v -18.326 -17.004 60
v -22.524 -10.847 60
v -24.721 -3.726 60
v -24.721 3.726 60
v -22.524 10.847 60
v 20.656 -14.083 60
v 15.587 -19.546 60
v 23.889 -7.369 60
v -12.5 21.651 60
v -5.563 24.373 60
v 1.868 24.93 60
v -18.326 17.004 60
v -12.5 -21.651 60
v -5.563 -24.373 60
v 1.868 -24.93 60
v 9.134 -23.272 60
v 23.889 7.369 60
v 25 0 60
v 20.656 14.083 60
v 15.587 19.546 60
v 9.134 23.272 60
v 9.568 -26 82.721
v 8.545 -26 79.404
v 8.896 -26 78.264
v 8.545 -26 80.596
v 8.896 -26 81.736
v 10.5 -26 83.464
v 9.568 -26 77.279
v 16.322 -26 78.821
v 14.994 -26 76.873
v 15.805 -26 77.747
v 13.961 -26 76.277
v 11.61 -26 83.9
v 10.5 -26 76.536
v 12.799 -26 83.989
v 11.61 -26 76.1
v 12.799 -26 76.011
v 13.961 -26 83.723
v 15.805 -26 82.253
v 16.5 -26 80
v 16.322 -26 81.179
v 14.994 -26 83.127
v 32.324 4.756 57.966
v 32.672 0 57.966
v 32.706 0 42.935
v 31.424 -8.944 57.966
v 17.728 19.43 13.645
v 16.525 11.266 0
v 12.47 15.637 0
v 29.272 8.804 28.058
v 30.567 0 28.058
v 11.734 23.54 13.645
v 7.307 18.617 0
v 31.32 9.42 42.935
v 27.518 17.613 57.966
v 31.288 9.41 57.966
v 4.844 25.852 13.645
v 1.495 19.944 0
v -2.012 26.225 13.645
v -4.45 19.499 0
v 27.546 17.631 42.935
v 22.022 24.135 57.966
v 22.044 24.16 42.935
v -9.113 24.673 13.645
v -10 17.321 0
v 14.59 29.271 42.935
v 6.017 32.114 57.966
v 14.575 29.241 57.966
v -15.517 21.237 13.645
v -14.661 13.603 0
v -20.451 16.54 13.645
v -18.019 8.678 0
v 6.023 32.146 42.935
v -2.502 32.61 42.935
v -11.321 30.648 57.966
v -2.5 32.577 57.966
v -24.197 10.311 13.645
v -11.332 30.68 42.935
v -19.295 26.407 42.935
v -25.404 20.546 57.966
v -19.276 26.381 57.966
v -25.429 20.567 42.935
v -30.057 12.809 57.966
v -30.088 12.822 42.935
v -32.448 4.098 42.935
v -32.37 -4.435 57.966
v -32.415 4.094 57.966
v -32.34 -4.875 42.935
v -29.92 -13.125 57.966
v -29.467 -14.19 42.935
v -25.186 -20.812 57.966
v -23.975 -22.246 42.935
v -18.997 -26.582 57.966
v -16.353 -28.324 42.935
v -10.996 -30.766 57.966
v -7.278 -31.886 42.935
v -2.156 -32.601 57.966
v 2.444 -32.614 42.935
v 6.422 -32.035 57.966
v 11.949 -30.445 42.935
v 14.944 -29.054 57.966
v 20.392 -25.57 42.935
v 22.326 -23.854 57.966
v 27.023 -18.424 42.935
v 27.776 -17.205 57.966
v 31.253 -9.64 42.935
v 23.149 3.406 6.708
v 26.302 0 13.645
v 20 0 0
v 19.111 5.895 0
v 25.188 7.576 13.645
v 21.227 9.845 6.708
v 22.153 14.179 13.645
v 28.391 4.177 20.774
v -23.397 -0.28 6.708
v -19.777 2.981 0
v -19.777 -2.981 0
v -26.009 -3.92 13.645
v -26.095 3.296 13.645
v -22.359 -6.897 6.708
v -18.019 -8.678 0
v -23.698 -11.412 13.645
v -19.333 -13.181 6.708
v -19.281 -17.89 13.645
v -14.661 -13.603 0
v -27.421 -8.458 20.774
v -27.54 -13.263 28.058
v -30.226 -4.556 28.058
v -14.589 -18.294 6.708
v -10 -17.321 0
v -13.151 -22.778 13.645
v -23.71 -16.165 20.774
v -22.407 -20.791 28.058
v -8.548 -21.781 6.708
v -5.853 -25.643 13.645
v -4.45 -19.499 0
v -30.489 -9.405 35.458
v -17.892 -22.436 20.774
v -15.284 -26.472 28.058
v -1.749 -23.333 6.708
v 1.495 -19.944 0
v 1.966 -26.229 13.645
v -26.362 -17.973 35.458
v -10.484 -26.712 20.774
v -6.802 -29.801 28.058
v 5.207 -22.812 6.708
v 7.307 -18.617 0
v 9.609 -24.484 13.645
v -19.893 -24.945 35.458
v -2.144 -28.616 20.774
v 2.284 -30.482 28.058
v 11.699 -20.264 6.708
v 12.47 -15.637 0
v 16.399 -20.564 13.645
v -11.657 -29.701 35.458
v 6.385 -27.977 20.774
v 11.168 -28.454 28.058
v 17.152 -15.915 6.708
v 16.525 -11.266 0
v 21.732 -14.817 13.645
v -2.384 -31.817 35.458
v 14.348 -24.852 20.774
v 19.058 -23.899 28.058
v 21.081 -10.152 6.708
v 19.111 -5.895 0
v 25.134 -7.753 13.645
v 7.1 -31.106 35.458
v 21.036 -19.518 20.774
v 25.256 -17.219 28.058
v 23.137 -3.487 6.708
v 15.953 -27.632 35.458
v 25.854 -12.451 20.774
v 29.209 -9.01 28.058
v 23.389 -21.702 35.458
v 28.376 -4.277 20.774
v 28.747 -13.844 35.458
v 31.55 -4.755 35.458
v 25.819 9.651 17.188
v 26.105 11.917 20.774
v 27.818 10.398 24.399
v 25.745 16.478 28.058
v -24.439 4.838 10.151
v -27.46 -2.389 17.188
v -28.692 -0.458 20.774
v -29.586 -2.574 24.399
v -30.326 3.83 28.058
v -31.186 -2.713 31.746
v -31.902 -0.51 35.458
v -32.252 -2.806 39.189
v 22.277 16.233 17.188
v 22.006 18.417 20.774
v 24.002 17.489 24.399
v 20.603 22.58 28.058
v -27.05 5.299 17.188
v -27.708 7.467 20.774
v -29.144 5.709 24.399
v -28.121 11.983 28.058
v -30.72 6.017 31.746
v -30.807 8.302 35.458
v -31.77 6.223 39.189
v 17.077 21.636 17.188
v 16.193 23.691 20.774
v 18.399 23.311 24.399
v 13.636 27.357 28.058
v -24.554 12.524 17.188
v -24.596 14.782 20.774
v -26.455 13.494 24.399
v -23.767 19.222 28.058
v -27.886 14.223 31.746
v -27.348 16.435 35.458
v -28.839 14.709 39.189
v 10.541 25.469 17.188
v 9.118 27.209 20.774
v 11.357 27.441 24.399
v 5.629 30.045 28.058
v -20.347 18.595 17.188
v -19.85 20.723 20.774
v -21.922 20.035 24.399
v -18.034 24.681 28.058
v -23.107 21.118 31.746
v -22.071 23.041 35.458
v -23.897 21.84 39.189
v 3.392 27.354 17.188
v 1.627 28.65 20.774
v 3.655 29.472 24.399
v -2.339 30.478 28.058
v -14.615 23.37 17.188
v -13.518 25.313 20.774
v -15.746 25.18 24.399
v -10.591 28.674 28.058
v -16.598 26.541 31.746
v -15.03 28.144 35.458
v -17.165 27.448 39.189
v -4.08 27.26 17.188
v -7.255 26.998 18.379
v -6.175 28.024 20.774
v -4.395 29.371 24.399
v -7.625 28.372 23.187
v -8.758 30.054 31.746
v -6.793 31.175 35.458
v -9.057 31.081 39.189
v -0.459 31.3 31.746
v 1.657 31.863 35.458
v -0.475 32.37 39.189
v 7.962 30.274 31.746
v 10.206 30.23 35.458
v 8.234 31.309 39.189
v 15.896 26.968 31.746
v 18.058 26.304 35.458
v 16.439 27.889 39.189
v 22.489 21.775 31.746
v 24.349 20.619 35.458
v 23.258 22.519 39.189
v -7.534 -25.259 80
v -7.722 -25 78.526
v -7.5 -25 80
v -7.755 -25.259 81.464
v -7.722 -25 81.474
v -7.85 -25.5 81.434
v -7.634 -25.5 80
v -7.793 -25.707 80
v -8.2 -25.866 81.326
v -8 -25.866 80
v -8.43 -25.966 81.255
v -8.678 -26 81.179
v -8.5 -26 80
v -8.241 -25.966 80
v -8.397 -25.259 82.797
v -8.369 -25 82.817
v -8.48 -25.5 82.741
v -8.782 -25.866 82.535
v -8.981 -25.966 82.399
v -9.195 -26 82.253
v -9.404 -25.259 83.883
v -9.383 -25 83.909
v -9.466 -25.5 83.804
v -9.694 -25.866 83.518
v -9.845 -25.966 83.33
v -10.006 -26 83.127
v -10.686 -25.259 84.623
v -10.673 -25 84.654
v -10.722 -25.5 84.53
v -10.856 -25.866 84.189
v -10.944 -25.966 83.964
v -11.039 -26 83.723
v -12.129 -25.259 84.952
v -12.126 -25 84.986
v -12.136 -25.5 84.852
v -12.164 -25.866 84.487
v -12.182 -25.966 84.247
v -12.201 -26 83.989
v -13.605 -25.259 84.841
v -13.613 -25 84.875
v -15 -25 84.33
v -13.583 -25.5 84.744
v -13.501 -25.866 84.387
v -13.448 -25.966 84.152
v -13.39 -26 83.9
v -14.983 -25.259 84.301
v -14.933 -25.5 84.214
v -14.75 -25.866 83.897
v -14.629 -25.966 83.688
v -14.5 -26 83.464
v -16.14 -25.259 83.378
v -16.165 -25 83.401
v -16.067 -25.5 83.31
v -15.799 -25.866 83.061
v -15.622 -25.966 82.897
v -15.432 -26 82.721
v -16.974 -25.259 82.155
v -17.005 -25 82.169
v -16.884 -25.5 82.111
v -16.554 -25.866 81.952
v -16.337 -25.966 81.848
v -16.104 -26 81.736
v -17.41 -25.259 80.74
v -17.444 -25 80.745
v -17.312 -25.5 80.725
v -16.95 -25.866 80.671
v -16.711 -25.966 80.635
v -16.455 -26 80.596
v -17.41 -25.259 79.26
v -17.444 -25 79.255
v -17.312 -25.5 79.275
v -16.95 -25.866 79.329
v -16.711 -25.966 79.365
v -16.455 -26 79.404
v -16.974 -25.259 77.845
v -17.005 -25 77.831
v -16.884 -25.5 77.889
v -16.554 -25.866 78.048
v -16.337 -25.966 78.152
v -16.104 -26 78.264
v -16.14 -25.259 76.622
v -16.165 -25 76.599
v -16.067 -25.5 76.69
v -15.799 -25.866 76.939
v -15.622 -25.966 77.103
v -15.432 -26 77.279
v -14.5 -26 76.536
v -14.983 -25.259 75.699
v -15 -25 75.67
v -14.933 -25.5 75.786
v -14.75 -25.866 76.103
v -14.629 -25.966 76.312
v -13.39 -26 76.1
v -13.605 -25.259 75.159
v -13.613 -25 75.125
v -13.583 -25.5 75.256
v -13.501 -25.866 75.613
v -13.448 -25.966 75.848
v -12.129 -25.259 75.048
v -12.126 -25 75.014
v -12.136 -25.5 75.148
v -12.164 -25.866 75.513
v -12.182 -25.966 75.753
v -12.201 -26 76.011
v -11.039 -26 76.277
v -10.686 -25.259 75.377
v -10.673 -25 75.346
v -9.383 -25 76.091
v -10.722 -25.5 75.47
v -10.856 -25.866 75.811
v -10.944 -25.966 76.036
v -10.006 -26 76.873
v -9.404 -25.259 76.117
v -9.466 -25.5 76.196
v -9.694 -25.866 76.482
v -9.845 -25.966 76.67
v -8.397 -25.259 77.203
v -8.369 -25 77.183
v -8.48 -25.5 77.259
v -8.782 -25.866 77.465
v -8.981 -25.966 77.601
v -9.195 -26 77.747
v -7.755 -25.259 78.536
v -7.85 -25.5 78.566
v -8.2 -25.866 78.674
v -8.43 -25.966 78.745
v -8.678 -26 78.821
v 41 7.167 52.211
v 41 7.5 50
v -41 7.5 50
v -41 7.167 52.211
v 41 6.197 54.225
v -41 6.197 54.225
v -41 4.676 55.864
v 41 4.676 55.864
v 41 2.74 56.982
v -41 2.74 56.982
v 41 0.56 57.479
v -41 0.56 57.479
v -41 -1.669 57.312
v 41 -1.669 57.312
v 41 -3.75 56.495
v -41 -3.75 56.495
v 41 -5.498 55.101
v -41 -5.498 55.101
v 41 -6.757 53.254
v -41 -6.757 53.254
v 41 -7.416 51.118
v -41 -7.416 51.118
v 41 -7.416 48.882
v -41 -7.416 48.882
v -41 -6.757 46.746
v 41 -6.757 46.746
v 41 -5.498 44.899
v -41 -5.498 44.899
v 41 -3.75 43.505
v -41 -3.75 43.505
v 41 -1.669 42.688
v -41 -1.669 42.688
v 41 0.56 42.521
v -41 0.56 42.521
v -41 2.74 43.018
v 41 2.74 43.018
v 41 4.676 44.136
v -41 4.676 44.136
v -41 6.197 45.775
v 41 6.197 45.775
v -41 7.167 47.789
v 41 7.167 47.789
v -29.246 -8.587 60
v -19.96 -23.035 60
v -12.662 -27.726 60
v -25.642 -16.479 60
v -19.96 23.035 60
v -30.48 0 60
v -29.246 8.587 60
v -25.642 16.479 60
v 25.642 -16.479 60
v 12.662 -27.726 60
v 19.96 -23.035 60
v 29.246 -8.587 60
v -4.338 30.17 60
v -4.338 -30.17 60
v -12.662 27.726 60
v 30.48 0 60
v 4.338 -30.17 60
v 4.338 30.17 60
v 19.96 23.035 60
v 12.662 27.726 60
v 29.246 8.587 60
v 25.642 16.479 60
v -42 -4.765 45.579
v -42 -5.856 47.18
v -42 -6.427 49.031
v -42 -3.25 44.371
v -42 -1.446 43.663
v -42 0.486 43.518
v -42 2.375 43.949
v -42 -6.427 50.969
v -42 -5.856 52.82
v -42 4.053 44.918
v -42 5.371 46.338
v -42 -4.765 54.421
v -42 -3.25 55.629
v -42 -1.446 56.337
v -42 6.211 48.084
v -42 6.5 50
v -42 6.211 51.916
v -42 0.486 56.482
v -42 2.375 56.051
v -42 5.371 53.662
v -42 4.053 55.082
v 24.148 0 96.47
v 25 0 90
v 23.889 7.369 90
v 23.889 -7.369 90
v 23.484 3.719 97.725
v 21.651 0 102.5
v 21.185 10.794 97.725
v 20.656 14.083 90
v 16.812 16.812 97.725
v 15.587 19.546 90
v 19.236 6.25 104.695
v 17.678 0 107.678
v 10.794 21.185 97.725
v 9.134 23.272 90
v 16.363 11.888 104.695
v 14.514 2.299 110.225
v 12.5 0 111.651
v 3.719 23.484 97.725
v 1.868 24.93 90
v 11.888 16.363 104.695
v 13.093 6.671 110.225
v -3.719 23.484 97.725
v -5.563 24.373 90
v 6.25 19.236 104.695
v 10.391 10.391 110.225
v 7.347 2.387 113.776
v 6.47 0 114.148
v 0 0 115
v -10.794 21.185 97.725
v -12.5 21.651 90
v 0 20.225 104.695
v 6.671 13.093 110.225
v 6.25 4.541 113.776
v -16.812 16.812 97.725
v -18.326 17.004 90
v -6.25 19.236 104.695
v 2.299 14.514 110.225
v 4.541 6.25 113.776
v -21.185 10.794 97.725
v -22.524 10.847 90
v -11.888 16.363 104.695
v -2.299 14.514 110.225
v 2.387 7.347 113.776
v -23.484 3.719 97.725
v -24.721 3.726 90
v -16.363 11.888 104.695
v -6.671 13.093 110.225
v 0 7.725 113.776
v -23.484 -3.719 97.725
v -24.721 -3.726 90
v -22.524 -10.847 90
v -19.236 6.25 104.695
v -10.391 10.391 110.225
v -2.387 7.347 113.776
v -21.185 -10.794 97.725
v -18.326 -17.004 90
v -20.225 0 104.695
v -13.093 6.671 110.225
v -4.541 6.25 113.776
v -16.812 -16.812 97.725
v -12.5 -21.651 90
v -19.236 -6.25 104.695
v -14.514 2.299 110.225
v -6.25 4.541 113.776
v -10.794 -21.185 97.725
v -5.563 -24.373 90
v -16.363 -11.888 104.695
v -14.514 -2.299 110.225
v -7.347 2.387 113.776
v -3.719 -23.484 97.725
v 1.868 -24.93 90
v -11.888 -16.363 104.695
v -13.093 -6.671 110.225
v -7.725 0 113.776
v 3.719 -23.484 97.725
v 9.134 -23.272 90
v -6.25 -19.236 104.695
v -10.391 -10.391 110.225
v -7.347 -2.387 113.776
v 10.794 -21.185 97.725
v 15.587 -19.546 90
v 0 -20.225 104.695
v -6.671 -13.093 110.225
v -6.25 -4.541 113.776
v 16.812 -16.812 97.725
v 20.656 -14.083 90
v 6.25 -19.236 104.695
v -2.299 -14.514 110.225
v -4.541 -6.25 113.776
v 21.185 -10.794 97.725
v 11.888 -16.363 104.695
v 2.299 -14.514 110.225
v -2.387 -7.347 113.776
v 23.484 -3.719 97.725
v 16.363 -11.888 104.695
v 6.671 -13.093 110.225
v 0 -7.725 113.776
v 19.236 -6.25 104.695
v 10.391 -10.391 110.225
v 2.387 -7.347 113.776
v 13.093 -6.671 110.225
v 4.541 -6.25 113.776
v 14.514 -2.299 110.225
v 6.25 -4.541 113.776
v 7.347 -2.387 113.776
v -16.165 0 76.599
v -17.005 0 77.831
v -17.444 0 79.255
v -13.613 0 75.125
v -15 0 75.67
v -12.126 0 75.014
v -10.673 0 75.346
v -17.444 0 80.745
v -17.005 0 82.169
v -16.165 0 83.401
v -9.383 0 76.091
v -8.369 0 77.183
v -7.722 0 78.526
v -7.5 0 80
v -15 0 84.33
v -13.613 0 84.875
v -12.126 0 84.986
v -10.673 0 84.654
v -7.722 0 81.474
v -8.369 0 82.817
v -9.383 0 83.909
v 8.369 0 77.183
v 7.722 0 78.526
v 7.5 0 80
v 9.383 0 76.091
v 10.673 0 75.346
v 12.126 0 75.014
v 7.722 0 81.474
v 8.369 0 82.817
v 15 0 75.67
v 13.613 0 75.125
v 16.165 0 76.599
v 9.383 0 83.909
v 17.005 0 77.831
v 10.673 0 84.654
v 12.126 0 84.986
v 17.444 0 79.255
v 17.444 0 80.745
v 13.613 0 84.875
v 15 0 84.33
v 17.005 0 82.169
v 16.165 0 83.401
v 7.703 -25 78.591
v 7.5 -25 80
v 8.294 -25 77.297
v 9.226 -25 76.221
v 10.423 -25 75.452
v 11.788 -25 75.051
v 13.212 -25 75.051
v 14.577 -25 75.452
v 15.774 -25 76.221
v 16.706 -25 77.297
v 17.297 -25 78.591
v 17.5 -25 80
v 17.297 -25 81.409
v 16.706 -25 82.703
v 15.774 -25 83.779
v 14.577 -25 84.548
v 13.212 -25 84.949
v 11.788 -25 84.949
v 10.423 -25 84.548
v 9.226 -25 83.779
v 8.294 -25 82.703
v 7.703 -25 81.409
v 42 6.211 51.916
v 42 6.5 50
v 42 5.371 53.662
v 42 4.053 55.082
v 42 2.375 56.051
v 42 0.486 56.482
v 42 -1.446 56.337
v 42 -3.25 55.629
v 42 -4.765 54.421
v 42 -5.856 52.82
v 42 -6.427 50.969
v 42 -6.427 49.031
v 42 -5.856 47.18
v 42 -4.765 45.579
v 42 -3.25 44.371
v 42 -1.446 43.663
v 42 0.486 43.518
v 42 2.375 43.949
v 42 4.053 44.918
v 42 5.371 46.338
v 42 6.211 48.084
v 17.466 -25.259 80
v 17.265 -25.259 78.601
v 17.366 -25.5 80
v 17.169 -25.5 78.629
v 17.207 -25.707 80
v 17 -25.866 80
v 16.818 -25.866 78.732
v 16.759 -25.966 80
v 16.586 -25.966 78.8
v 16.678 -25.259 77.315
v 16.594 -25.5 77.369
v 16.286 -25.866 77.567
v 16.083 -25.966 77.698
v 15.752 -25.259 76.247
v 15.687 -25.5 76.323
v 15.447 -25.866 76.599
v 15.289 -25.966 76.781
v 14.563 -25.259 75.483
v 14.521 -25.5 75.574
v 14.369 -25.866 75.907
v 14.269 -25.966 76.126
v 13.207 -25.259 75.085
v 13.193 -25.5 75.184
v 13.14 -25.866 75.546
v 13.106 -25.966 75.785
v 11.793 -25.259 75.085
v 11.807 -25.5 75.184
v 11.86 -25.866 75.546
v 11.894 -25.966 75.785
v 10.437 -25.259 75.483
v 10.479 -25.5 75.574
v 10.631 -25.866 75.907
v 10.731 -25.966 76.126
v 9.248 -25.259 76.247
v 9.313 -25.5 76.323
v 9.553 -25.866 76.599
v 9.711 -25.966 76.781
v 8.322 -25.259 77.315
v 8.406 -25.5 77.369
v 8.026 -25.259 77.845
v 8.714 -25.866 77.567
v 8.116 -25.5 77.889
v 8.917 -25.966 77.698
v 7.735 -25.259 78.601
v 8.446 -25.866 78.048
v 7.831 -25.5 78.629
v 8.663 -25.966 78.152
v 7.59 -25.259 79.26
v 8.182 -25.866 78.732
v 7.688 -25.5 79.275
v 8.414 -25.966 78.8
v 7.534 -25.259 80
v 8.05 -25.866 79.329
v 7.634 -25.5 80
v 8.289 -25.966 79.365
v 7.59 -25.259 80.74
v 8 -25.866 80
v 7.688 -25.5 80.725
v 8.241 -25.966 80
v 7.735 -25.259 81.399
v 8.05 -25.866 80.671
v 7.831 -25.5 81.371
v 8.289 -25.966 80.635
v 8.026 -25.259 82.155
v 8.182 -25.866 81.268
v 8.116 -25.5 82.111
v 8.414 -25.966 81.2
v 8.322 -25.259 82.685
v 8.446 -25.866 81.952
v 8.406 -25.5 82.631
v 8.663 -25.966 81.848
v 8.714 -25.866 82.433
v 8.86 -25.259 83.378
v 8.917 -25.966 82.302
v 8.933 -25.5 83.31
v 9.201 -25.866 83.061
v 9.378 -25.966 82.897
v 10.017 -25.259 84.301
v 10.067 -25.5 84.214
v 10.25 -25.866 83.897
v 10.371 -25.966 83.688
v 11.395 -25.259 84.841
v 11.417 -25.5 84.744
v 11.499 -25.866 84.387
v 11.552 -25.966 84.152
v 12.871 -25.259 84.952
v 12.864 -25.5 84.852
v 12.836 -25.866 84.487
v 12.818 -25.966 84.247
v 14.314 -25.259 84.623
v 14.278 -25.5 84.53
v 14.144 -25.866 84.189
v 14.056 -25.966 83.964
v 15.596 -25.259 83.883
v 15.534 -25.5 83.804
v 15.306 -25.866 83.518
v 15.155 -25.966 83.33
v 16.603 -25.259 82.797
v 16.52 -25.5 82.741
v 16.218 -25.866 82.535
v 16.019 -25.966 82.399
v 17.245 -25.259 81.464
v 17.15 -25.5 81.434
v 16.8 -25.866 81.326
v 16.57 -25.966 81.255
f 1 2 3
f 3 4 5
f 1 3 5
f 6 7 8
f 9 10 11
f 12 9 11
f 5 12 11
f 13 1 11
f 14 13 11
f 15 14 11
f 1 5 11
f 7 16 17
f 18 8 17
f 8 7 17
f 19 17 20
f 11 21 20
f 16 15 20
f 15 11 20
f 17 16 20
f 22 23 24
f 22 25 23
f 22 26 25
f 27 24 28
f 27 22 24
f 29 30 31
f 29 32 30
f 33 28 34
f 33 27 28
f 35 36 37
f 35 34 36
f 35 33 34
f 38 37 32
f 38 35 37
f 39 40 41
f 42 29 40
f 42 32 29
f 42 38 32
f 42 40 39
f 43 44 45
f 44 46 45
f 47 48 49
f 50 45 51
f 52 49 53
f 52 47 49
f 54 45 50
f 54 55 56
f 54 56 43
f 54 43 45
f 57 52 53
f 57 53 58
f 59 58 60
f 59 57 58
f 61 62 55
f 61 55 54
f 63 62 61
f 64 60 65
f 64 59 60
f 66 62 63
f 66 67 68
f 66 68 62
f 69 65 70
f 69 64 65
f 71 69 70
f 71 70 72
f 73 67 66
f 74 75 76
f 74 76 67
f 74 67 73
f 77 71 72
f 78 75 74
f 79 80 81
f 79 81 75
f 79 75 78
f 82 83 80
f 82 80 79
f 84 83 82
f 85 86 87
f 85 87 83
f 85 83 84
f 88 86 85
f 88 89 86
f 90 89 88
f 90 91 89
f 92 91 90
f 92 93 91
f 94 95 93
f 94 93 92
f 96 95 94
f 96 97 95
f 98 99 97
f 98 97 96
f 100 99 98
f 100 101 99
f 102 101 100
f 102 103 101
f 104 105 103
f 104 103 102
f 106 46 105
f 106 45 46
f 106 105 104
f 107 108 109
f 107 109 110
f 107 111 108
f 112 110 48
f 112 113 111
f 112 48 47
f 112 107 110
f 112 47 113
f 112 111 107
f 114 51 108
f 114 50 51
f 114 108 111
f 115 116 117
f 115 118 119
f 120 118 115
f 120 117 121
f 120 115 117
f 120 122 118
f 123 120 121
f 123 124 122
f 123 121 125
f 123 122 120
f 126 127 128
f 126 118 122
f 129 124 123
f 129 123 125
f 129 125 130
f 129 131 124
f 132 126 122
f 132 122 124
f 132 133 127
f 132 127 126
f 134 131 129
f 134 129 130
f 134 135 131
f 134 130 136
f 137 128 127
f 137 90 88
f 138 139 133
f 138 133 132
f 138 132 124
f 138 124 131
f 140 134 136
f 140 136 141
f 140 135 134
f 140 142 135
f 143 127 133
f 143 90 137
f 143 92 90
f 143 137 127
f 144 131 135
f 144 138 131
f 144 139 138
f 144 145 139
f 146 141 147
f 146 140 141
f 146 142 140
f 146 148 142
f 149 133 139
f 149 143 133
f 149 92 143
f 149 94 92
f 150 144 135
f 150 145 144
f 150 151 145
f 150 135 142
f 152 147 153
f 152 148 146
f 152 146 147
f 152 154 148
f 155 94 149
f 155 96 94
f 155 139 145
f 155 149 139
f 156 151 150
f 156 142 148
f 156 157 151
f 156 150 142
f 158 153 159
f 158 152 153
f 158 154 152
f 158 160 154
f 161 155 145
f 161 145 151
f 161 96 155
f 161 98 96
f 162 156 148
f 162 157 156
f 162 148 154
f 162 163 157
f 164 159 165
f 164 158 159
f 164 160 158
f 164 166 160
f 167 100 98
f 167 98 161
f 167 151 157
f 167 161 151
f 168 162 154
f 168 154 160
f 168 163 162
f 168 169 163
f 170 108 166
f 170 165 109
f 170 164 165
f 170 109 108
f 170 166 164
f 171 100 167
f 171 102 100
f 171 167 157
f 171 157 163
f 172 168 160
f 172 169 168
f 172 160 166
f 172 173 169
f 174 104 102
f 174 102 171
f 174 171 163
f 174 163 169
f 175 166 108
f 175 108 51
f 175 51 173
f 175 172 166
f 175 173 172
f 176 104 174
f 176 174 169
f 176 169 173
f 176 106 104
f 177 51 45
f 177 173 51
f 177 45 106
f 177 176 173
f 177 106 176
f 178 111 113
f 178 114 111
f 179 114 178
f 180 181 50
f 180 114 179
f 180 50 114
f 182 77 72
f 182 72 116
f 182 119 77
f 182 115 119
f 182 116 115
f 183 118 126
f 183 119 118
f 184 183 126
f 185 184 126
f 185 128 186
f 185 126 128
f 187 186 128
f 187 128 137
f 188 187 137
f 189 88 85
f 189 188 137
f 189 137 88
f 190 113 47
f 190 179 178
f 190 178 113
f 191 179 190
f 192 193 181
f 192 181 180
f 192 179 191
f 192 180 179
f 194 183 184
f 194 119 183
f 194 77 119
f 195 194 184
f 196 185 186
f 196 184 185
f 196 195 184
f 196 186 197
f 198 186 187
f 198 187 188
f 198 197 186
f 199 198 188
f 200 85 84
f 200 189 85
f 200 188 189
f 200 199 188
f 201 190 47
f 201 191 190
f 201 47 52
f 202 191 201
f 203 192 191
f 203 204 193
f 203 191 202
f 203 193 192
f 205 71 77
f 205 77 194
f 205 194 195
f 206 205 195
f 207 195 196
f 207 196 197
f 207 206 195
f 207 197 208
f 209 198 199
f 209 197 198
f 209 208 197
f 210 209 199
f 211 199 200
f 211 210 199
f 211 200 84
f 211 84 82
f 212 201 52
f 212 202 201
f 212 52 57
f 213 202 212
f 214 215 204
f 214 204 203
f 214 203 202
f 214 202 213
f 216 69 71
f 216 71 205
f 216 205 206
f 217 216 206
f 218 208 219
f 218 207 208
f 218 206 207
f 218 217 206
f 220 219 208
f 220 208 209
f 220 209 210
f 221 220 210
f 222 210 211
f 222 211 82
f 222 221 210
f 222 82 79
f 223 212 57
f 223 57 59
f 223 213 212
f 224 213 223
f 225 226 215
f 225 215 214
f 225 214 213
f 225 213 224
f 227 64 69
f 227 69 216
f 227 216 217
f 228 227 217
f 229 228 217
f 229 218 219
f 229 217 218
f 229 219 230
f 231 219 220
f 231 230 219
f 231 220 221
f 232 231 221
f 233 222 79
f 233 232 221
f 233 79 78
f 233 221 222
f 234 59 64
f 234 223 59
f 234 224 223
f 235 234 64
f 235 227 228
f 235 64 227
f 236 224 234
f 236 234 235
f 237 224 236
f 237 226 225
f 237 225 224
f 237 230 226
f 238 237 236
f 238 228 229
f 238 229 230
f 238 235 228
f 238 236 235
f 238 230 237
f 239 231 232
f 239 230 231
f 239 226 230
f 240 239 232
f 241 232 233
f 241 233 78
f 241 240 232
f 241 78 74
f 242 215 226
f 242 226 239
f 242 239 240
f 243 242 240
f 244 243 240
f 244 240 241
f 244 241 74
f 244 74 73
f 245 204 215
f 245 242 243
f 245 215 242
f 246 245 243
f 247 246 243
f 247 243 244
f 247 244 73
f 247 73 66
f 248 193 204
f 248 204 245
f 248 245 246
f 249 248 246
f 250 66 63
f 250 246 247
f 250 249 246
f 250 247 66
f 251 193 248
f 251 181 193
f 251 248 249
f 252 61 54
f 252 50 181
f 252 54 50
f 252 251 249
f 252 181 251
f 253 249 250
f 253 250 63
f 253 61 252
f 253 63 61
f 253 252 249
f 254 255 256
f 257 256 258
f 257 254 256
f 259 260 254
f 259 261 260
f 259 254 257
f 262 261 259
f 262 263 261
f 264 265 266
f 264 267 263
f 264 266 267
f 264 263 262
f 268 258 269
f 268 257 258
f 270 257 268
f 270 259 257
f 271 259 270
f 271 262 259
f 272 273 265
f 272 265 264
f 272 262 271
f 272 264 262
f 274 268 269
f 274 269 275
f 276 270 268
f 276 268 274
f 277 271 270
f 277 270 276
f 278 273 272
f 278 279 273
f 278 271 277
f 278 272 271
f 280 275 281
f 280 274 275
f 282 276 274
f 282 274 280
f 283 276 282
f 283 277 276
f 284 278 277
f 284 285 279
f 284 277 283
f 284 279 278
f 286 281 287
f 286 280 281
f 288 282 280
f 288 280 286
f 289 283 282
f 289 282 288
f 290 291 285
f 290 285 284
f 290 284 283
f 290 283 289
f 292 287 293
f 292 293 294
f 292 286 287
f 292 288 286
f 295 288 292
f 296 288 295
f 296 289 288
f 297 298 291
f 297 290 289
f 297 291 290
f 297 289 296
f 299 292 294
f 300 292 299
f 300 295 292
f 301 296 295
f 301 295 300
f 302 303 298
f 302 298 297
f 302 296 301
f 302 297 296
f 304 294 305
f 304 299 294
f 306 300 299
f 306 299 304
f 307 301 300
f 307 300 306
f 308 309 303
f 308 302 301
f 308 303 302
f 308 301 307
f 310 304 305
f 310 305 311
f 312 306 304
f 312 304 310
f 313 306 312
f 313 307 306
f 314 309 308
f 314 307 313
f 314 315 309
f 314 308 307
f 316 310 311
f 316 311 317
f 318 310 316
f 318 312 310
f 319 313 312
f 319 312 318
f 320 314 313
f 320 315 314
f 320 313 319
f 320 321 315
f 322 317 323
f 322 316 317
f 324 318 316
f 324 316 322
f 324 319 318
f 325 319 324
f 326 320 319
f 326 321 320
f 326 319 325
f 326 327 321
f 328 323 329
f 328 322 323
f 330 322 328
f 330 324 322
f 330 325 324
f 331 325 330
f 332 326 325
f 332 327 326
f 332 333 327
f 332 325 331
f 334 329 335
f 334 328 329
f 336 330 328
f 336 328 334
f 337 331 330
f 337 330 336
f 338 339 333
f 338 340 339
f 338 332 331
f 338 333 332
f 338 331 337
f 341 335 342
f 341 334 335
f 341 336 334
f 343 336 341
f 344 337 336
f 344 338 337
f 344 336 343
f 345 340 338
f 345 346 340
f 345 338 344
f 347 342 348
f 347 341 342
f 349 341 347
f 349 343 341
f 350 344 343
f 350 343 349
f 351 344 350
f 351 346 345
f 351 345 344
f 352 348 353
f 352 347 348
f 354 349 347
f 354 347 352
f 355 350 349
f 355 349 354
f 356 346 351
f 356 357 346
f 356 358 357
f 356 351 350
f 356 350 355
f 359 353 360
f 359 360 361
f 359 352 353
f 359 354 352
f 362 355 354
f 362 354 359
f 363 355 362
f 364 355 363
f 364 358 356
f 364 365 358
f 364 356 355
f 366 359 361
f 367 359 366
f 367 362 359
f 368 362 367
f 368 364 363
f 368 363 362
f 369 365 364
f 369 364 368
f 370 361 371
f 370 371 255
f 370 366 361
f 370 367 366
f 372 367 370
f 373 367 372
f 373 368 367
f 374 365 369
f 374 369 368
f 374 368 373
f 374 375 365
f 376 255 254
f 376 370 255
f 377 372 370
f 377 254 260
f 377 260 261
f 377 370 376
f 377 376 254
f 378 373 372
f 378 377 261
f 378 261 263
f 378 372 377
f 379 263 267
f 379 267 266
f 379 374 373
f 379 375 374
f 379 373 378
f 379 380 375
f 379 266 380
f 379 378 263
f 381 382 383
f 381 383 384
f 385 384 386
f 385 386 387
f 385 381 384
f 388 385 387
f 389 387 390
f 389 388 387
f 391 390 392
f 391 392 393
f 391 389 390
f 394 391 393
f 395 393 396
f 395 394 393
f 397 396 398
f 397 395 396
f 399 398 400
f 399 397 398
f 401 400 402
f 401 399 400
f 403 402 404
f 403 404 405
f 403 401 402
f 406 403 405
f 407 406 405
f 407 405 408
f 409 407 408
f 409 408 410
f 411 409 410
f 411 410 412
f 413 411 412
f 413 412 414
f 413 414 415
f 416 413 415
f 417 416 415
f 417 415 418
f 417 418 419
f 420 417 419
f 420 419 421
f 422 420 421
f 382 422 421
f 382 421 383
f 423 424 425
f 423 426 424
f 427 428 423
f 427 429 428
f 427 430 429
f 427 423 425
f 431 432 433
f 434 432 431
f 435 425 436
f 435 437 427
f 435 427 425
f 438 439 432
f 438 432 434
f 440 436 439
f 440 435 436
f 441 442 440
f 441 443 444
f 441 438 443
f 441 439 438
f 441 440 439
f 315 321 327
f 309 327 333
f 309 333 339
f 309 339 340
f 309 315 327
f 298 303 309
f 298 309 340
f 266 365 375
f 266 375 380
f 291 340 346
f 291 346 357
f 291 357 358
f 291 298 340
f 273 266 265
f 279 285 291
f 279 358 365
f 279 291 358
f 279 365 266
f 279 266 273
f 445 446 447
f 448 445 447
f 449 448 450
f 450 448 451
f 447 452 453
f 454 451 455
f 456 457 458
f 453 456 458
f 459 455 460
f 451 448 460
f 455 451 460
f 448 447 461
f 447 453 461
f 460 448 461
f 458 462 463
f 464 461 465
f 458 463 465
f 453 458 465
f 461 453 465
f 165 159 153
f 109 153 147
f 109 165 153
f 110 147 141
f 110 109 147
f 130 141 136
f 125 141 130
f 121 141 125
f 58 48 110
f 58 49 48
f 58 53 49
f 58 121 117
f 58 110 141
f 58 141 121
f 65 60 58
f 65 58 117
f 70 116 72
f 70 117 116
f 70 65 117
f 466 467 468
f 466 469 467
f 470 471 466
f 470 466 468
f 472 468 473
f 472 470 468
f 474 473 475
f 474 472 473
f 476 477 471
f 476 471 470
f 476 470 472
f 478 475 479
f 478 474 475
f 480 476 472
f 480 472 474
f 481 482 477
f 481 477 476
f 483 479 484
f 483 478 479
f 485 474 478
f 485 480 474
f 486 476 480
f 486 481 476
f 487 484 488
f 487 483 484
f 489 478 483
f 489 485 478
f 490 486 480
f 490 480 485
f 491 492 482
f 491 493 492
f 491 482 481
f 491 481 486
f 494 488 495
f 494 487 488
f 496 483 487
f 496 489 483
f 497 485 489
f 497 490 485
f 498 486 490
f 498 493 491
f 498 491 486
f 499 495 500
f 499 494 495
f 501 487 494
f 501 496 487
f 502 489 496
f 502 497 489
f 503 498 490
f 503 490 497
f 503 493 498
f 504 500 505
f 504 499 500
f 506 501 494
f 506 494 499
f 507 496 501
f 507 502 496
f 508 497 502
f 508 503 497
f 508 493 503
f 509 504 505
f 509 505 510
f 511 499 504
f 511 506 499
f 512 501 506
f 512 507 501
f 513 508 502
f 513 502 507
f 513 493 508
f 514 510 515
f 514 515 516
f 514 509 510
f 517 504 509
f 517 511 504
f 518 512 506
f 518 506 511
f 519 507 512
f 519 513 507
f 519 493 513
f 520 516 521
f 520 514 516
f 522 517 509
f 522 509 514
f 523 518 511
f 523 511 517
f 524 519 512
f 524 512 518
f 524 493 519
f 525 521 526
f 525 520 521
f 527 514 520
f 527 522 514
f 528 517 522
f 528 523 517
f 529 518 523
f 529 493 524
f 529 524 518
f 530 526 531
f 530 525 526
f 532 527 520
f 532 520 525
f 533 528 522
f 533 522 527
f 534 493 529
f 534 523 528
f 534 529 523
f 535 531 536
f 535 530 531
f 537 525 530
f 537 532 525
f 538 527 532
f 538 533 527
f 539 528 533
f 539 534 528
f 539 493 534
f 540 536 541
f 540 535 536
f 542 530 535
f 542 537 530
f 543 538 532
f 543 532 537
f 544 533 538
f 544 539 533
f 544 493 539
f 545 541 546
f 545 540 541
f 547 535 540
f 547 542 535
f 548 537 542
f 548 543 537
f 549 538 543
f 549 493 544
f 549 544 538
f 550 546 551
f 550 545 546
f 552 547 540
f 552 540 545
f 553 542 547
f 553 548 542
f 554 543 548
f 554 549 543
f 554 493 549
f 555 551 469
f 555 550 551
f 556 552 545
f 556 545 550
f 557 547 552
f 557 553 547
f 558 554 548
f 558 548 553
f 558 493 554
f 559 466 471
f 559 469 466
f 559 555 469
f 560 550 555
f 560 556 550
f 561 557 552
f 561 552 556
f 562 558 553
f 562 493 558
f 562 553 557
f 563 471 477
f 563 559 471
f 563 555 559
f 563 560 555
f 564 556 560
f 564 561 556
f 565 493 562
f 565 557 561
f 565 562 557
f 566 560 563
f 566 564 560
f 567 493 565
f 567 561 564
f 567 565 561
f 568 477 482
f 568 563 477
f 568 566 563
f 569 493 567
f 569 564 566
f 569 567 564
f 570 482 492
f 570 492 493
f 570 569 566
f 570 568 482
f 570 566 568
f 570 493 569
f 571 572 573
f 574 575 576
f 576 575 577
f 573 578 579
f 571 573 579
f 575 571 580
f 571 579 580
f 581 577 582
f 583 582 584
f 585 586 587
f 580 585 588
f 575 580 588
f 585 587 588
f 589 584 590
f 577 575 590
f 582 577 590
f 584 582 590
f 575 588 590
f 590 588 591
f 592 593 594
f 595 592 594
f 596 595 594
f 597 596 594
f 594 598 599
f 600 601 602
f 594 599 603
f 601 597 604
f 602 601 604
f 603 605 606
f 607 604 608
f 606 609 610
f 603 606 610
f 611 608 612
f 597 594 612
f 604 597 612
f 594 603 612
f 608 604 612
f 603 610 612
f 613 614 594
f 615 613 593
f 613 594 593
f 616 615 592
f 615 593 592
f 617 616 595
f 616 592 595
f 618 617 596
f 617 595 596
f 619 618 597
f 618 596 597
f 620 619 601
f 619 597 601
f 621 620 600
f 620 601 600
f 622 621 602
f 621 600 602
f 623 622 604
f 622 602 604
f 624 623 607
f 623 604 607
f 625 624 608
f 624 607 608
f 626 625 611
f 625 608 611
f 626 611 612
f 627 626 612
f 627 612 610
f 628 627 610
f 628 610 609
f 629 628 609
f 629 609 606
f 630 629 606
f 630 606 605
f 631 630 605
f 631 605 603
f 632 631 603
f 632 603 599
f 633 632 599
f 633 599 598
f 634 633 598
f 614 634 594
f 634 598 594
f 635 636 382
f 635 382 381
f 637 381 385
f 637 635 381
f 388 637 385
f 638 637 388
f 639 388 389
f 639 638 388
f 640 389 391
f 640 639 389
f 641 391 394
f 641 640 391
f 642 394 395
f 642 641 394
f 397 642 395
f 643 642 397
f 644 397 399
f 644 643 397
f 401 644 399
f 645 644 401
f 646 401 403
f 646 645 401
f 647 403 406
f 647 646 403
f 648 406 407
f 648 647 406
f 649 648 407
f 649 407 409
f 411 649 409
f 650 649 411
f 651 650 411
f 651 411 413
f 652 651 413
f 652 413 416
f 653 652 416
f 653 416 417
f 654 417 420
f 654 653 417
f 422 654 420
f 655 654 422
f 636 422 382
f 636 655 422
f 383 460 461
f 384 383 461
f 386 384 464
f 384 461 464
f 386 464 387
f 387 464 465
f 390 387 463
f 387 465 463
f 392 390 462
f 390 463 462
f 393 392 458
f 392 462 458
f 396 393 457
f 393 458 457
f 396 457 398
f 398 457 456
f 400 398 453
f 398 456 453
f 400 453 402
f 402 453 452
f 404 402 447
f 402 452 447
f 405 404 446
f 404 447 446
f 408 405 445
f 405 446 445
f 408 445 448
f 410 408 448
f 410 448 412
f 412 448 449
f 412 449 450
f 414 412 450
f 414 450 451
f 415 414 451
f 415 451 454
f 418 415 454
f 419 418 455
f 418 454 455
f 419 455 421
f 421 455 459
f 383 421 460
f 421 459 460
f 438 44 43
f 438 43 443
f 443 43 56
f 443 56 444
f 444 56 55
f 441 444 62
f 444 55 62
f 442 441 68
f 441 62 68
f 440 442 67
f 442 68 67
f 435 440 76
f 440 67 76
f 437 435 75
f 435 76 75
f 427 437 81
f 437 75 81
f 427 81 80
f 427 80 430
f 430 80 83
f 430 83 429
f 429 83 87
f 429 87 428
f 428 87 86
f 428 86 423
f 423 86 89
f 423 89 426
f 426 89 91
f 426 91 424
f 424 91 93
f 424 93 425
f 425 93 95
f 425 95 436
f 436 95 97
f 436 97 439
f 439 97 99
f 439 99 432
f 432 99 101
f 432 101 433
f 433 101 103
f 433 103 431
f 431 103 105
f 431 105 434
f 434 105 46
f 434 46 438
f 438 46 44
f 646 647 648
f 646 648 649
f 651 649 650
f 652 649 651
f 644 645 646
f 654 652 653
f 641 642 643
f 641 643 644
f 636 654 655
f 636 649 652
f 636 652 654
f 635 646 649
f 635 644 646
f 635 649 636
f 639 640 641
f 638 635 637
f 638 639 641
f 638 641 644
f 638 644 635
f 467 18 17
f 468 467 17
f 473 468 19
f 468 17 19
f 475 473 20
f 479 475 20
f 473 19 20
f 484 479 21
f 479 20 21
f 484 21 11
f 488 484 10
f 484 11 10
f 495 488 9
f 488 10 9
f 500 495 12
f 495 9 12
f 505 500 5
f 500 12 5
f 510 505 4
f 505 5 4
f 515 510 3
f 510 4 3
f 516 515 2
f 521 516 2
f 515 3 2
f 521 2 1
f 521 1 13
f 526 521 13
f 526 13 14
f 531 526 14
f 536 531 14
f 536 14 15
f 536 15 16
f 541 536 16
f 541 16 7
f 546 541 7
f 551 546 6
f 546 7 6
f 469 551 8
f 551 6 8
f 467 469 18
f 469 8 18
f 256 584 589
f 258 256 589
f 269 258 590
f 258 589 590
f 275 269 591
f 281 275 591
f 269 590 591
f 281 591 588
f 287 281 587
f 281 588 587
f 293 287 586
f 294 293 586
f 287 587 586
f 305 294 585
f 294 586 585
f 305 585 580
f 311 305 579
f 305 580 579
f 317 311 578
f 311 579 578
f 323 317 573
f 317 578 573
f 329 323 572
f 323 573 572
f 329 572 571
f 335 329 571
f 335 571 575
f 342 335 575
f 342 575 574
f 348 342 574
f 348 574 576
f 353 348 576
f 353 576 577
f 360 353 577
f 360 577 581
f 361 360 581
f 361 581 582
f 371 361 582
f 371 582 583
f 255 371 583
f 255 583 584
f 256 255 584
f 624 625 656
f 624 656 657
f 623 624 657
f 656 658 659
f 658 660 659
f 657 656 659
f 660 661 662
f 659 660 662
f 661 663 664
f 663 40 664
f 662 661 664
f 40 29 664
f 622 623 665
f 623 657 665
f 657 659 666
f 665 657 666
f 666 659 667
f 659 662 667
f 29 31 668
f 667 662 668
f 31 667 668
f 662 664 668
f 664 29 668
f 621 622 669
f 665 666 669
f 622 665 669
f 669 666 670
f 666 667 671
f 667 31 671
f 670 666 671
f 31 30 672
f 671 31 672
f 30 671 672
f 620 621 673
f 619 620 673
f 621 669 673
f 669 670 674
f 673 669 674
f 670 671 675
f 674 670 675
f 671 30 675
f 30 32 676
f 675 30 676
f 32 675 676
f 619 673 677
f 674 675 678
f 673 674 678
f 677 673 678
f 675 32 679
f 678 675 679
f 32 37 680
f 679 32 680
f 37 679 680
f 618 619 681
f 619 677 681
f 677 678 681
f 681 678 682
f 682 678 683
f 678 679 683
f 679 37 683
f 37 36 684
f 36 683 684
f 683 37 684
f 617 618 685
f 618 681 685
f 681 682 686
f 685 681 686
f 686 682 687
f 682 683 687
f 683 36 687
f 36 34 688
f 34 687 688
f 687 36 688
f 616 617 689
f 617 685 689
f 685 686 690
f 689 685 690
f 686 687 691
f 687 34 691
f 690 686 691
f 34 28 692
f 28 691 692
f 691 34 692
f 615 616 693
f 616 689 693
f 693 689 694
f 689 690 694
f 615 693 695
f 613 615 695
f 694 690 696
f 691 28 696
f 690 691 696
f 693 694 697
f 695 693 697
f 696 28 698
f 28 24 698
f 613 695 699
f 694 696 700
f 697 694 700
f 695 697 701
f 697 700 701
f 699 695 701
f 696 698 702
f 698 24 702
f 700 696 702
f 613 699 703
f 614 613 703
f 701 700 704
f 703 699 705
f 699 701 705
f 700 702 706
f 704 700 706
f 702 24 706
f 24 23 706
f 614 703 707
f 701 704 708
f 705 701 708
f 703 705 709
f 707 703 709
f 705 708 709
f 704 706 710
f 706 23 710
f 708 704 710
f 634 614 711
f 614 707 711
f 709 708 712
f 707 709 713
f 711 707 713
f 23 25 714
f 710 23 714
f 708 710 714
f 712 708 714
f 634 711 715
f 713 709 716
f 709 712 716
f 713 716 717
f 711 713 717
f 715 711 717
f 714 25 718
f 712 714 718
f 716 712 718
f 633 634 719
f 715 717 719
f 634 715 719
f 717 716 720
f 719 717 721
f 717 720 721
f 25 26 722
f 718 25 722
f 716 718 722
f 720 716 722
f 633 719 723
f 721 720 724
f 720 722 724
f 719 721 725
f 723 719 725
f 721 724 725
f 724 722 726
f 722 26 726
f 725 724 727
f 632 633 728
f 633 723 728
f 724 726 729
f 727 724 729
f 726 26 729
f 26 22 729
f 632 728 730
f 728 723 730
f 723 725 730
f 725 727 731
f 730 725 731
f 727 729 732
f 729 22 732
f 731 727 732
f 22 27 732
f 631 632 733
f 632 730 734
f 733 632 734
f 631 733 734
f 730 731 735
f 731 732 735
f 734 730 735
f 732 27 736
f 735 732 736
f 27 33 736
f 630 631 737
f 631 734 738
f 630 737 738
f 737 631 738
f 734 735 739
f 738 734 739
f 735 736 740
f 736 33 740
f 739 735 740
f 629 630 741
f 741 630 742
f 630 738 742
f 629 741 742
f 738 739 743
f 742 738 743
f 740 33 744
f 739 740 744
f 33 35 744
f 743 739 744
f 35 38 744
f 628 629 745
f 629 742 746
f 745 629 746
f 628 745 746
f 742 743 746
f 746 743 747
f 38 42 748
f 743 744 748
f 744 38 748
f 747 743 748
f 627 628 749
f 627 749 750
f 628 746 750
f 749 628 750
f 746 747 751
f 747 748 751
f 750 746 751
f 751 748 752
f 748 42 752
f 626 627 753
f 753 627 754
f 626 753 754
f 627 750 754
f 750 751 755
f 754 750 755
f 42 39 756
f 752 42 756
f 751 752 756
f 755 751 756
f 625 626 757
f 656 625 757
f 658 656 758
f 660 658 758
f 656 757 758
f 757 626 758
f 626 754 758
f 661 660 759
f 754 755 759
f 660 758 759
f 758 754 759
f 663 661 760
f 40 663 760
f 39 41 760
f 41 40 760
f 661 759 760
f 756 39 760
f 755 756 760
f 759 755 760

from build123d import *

# Parameters (mm, degrees)
F3_R      = 25
F5_DEPTH  = 55
F6_R      = 25
F4_R      = 5
F7_DEPTH  = 26
F10_DEPTH = 42
F11_SIZE  = 1


# Not quite as in the source:
# - a fillet or chamfer that OpenCascade refuses, or shapes differently, is made with other operations: its cross-section is extruded or revolved along the edge and cut away or added


with BuildPart() as f1:
    # F0 (on Front) → F1 (revolve)
    with BuildSketch(Plane.XZ):
        with BuildLine():
            Line((0, 60), (0, 0))
            Line((0, 0), (20, 0))
            ThreePointArc((20, 0), (30.7804742264, 29.0561512028), (32.5, 60))
            Line((32.5, 60), (0, 60))
        make_face()
    revolve(axis=Axis((0, 0, 30), (0, 0, 1)))

    # F2: chamfer of 2 on 1 edges, made by hand

    # F2_s1 → F2_t2 (revolve, cut)
    with BuildSketch(Plane.XZ):
        with BuildLine():
            Line((30.42161571, 60.0544167929), (32.7310120298, 57.9113922058))
            Line((32.7310120298, 57.9113922058), (32.7709004847, 57.914377364))
            ThreePointArc((32.7709004847, 57.914377364), (32.6335391575, 58.9572189948), (32.539822014, 60.0037692442))
            Line((32.539822014, 60.0037692442), (32.5, 60.04))
            ThreePointArc((32.5, 60.04), (31.460807855, 60.04), (30.42161571, 60.0944167929))
            Line((30.42161571, 60.0944167929), (30.42161571, 60.0544167929))
        make_face()
    revolve(axis=Axis((0, 0, 60), (0, 0, 1)), mode=Mode.SUBTRACT)


with BuildPart() as f5:
    # F3 (on face) → F5 (new body)
    with BuildSketch(Plane.XY.offset(60)):
        Circle(F3_R)
    extrude(amount=F5_DEPTH)

    # F6
    f6_edges = [f5.edges().sort_by_distance(p)[0] for p in [
        (-25, 0, 115),
    ]]
    fillet(f6_edges, radius=F6_R)


with BuildPart() as f7:
    # F4 (on Front) → F7 (new body)
    with BuildSketch(Plane.XZ):
        with Locations((-12.5, 80)):
            Circle(F4_R)
    extrude(amount=F7_DEPTH)

    # F8: fillet of radius 1 on 1 edges, made by hand

    # F8_s1 → F8_t2 (revolve, cut)
    with BuildSketch(Plane.XY.offset(80)):
        with BuildLine():
            ThreePointArc((-7.5, -25), (-7.7928932188, -25.7071067812), (-8.5, -26))
            Line((-8.5, -26), (-7.5, -26))
            Line((-7.5, -26), (-7.5, -25))
        make_face()
    revolve(axis=Axis((-12.5, -26, 80), (0, -1, 0)), mode=Mode.SUBTRACT)


with BuildPart() as f7b:
    # F4 (on Front) → F7, piece 2 (new body)
    with BuildSketch(Plane.XZ):
        with BuildLine():
            ThreePointArc((17.5, 80), (12.5, 85), (7.5, 80))
            ThreePointArc((7.5, 80), (12.5, 75), (17.5, 80))
        make_face()
    extrude(amount=F7_DEPTH)

    # F8#2: fillet of radius 1 on 1 edges, made by hand

    # F8_2_s1 → F8_2_t2 (revolve, cut)
    with BuildSketch(Plane.XY.offset(80)):
        with BuildLine():
            ThreePointArc((17.5, -25), (17.2071067812, -25.7071067812), (16.5, -26))
            Line((16.5, -26), (17.5, -26))
            Line((17.5, -26), (17.5, -25))
        make_face()
    revolve(axis=Axis((12.5, -26, 80), (0, 1, 0)), mode=Mode.SUBTRACT)


with BuildPart() as f10:
    # F9 (on Right) → F10 (new body, symmetric)
    with BuildSketch(Plane.YZ):
        with BuildLine():
            ThreePointArc((0, 42.5), (5.3033008589, 44.6966991411), (7.5, 50))
            ThreePointArc((7.5, 50), (-5.3033008589, 55.3033008589), (0, 42.5))
        make_face()
    extrude(amount=F10_DEPTH, both=True)

    # F11
    f11_edges = [f10.edges().sort_by_distance(p)[0] for p in [
        (42, -5.303301, 55.303301),
        (-42, -5.303301, 55.303301),
        (-42, 5.303301, 44.696699),
        (42, 5.303301, 44.696699),
    ]]
    chamfer(f11_edges, length=F11_SIZE)


solid = Compound([f1.part, f5.part, f7.part, f7b.part, f10.part])
